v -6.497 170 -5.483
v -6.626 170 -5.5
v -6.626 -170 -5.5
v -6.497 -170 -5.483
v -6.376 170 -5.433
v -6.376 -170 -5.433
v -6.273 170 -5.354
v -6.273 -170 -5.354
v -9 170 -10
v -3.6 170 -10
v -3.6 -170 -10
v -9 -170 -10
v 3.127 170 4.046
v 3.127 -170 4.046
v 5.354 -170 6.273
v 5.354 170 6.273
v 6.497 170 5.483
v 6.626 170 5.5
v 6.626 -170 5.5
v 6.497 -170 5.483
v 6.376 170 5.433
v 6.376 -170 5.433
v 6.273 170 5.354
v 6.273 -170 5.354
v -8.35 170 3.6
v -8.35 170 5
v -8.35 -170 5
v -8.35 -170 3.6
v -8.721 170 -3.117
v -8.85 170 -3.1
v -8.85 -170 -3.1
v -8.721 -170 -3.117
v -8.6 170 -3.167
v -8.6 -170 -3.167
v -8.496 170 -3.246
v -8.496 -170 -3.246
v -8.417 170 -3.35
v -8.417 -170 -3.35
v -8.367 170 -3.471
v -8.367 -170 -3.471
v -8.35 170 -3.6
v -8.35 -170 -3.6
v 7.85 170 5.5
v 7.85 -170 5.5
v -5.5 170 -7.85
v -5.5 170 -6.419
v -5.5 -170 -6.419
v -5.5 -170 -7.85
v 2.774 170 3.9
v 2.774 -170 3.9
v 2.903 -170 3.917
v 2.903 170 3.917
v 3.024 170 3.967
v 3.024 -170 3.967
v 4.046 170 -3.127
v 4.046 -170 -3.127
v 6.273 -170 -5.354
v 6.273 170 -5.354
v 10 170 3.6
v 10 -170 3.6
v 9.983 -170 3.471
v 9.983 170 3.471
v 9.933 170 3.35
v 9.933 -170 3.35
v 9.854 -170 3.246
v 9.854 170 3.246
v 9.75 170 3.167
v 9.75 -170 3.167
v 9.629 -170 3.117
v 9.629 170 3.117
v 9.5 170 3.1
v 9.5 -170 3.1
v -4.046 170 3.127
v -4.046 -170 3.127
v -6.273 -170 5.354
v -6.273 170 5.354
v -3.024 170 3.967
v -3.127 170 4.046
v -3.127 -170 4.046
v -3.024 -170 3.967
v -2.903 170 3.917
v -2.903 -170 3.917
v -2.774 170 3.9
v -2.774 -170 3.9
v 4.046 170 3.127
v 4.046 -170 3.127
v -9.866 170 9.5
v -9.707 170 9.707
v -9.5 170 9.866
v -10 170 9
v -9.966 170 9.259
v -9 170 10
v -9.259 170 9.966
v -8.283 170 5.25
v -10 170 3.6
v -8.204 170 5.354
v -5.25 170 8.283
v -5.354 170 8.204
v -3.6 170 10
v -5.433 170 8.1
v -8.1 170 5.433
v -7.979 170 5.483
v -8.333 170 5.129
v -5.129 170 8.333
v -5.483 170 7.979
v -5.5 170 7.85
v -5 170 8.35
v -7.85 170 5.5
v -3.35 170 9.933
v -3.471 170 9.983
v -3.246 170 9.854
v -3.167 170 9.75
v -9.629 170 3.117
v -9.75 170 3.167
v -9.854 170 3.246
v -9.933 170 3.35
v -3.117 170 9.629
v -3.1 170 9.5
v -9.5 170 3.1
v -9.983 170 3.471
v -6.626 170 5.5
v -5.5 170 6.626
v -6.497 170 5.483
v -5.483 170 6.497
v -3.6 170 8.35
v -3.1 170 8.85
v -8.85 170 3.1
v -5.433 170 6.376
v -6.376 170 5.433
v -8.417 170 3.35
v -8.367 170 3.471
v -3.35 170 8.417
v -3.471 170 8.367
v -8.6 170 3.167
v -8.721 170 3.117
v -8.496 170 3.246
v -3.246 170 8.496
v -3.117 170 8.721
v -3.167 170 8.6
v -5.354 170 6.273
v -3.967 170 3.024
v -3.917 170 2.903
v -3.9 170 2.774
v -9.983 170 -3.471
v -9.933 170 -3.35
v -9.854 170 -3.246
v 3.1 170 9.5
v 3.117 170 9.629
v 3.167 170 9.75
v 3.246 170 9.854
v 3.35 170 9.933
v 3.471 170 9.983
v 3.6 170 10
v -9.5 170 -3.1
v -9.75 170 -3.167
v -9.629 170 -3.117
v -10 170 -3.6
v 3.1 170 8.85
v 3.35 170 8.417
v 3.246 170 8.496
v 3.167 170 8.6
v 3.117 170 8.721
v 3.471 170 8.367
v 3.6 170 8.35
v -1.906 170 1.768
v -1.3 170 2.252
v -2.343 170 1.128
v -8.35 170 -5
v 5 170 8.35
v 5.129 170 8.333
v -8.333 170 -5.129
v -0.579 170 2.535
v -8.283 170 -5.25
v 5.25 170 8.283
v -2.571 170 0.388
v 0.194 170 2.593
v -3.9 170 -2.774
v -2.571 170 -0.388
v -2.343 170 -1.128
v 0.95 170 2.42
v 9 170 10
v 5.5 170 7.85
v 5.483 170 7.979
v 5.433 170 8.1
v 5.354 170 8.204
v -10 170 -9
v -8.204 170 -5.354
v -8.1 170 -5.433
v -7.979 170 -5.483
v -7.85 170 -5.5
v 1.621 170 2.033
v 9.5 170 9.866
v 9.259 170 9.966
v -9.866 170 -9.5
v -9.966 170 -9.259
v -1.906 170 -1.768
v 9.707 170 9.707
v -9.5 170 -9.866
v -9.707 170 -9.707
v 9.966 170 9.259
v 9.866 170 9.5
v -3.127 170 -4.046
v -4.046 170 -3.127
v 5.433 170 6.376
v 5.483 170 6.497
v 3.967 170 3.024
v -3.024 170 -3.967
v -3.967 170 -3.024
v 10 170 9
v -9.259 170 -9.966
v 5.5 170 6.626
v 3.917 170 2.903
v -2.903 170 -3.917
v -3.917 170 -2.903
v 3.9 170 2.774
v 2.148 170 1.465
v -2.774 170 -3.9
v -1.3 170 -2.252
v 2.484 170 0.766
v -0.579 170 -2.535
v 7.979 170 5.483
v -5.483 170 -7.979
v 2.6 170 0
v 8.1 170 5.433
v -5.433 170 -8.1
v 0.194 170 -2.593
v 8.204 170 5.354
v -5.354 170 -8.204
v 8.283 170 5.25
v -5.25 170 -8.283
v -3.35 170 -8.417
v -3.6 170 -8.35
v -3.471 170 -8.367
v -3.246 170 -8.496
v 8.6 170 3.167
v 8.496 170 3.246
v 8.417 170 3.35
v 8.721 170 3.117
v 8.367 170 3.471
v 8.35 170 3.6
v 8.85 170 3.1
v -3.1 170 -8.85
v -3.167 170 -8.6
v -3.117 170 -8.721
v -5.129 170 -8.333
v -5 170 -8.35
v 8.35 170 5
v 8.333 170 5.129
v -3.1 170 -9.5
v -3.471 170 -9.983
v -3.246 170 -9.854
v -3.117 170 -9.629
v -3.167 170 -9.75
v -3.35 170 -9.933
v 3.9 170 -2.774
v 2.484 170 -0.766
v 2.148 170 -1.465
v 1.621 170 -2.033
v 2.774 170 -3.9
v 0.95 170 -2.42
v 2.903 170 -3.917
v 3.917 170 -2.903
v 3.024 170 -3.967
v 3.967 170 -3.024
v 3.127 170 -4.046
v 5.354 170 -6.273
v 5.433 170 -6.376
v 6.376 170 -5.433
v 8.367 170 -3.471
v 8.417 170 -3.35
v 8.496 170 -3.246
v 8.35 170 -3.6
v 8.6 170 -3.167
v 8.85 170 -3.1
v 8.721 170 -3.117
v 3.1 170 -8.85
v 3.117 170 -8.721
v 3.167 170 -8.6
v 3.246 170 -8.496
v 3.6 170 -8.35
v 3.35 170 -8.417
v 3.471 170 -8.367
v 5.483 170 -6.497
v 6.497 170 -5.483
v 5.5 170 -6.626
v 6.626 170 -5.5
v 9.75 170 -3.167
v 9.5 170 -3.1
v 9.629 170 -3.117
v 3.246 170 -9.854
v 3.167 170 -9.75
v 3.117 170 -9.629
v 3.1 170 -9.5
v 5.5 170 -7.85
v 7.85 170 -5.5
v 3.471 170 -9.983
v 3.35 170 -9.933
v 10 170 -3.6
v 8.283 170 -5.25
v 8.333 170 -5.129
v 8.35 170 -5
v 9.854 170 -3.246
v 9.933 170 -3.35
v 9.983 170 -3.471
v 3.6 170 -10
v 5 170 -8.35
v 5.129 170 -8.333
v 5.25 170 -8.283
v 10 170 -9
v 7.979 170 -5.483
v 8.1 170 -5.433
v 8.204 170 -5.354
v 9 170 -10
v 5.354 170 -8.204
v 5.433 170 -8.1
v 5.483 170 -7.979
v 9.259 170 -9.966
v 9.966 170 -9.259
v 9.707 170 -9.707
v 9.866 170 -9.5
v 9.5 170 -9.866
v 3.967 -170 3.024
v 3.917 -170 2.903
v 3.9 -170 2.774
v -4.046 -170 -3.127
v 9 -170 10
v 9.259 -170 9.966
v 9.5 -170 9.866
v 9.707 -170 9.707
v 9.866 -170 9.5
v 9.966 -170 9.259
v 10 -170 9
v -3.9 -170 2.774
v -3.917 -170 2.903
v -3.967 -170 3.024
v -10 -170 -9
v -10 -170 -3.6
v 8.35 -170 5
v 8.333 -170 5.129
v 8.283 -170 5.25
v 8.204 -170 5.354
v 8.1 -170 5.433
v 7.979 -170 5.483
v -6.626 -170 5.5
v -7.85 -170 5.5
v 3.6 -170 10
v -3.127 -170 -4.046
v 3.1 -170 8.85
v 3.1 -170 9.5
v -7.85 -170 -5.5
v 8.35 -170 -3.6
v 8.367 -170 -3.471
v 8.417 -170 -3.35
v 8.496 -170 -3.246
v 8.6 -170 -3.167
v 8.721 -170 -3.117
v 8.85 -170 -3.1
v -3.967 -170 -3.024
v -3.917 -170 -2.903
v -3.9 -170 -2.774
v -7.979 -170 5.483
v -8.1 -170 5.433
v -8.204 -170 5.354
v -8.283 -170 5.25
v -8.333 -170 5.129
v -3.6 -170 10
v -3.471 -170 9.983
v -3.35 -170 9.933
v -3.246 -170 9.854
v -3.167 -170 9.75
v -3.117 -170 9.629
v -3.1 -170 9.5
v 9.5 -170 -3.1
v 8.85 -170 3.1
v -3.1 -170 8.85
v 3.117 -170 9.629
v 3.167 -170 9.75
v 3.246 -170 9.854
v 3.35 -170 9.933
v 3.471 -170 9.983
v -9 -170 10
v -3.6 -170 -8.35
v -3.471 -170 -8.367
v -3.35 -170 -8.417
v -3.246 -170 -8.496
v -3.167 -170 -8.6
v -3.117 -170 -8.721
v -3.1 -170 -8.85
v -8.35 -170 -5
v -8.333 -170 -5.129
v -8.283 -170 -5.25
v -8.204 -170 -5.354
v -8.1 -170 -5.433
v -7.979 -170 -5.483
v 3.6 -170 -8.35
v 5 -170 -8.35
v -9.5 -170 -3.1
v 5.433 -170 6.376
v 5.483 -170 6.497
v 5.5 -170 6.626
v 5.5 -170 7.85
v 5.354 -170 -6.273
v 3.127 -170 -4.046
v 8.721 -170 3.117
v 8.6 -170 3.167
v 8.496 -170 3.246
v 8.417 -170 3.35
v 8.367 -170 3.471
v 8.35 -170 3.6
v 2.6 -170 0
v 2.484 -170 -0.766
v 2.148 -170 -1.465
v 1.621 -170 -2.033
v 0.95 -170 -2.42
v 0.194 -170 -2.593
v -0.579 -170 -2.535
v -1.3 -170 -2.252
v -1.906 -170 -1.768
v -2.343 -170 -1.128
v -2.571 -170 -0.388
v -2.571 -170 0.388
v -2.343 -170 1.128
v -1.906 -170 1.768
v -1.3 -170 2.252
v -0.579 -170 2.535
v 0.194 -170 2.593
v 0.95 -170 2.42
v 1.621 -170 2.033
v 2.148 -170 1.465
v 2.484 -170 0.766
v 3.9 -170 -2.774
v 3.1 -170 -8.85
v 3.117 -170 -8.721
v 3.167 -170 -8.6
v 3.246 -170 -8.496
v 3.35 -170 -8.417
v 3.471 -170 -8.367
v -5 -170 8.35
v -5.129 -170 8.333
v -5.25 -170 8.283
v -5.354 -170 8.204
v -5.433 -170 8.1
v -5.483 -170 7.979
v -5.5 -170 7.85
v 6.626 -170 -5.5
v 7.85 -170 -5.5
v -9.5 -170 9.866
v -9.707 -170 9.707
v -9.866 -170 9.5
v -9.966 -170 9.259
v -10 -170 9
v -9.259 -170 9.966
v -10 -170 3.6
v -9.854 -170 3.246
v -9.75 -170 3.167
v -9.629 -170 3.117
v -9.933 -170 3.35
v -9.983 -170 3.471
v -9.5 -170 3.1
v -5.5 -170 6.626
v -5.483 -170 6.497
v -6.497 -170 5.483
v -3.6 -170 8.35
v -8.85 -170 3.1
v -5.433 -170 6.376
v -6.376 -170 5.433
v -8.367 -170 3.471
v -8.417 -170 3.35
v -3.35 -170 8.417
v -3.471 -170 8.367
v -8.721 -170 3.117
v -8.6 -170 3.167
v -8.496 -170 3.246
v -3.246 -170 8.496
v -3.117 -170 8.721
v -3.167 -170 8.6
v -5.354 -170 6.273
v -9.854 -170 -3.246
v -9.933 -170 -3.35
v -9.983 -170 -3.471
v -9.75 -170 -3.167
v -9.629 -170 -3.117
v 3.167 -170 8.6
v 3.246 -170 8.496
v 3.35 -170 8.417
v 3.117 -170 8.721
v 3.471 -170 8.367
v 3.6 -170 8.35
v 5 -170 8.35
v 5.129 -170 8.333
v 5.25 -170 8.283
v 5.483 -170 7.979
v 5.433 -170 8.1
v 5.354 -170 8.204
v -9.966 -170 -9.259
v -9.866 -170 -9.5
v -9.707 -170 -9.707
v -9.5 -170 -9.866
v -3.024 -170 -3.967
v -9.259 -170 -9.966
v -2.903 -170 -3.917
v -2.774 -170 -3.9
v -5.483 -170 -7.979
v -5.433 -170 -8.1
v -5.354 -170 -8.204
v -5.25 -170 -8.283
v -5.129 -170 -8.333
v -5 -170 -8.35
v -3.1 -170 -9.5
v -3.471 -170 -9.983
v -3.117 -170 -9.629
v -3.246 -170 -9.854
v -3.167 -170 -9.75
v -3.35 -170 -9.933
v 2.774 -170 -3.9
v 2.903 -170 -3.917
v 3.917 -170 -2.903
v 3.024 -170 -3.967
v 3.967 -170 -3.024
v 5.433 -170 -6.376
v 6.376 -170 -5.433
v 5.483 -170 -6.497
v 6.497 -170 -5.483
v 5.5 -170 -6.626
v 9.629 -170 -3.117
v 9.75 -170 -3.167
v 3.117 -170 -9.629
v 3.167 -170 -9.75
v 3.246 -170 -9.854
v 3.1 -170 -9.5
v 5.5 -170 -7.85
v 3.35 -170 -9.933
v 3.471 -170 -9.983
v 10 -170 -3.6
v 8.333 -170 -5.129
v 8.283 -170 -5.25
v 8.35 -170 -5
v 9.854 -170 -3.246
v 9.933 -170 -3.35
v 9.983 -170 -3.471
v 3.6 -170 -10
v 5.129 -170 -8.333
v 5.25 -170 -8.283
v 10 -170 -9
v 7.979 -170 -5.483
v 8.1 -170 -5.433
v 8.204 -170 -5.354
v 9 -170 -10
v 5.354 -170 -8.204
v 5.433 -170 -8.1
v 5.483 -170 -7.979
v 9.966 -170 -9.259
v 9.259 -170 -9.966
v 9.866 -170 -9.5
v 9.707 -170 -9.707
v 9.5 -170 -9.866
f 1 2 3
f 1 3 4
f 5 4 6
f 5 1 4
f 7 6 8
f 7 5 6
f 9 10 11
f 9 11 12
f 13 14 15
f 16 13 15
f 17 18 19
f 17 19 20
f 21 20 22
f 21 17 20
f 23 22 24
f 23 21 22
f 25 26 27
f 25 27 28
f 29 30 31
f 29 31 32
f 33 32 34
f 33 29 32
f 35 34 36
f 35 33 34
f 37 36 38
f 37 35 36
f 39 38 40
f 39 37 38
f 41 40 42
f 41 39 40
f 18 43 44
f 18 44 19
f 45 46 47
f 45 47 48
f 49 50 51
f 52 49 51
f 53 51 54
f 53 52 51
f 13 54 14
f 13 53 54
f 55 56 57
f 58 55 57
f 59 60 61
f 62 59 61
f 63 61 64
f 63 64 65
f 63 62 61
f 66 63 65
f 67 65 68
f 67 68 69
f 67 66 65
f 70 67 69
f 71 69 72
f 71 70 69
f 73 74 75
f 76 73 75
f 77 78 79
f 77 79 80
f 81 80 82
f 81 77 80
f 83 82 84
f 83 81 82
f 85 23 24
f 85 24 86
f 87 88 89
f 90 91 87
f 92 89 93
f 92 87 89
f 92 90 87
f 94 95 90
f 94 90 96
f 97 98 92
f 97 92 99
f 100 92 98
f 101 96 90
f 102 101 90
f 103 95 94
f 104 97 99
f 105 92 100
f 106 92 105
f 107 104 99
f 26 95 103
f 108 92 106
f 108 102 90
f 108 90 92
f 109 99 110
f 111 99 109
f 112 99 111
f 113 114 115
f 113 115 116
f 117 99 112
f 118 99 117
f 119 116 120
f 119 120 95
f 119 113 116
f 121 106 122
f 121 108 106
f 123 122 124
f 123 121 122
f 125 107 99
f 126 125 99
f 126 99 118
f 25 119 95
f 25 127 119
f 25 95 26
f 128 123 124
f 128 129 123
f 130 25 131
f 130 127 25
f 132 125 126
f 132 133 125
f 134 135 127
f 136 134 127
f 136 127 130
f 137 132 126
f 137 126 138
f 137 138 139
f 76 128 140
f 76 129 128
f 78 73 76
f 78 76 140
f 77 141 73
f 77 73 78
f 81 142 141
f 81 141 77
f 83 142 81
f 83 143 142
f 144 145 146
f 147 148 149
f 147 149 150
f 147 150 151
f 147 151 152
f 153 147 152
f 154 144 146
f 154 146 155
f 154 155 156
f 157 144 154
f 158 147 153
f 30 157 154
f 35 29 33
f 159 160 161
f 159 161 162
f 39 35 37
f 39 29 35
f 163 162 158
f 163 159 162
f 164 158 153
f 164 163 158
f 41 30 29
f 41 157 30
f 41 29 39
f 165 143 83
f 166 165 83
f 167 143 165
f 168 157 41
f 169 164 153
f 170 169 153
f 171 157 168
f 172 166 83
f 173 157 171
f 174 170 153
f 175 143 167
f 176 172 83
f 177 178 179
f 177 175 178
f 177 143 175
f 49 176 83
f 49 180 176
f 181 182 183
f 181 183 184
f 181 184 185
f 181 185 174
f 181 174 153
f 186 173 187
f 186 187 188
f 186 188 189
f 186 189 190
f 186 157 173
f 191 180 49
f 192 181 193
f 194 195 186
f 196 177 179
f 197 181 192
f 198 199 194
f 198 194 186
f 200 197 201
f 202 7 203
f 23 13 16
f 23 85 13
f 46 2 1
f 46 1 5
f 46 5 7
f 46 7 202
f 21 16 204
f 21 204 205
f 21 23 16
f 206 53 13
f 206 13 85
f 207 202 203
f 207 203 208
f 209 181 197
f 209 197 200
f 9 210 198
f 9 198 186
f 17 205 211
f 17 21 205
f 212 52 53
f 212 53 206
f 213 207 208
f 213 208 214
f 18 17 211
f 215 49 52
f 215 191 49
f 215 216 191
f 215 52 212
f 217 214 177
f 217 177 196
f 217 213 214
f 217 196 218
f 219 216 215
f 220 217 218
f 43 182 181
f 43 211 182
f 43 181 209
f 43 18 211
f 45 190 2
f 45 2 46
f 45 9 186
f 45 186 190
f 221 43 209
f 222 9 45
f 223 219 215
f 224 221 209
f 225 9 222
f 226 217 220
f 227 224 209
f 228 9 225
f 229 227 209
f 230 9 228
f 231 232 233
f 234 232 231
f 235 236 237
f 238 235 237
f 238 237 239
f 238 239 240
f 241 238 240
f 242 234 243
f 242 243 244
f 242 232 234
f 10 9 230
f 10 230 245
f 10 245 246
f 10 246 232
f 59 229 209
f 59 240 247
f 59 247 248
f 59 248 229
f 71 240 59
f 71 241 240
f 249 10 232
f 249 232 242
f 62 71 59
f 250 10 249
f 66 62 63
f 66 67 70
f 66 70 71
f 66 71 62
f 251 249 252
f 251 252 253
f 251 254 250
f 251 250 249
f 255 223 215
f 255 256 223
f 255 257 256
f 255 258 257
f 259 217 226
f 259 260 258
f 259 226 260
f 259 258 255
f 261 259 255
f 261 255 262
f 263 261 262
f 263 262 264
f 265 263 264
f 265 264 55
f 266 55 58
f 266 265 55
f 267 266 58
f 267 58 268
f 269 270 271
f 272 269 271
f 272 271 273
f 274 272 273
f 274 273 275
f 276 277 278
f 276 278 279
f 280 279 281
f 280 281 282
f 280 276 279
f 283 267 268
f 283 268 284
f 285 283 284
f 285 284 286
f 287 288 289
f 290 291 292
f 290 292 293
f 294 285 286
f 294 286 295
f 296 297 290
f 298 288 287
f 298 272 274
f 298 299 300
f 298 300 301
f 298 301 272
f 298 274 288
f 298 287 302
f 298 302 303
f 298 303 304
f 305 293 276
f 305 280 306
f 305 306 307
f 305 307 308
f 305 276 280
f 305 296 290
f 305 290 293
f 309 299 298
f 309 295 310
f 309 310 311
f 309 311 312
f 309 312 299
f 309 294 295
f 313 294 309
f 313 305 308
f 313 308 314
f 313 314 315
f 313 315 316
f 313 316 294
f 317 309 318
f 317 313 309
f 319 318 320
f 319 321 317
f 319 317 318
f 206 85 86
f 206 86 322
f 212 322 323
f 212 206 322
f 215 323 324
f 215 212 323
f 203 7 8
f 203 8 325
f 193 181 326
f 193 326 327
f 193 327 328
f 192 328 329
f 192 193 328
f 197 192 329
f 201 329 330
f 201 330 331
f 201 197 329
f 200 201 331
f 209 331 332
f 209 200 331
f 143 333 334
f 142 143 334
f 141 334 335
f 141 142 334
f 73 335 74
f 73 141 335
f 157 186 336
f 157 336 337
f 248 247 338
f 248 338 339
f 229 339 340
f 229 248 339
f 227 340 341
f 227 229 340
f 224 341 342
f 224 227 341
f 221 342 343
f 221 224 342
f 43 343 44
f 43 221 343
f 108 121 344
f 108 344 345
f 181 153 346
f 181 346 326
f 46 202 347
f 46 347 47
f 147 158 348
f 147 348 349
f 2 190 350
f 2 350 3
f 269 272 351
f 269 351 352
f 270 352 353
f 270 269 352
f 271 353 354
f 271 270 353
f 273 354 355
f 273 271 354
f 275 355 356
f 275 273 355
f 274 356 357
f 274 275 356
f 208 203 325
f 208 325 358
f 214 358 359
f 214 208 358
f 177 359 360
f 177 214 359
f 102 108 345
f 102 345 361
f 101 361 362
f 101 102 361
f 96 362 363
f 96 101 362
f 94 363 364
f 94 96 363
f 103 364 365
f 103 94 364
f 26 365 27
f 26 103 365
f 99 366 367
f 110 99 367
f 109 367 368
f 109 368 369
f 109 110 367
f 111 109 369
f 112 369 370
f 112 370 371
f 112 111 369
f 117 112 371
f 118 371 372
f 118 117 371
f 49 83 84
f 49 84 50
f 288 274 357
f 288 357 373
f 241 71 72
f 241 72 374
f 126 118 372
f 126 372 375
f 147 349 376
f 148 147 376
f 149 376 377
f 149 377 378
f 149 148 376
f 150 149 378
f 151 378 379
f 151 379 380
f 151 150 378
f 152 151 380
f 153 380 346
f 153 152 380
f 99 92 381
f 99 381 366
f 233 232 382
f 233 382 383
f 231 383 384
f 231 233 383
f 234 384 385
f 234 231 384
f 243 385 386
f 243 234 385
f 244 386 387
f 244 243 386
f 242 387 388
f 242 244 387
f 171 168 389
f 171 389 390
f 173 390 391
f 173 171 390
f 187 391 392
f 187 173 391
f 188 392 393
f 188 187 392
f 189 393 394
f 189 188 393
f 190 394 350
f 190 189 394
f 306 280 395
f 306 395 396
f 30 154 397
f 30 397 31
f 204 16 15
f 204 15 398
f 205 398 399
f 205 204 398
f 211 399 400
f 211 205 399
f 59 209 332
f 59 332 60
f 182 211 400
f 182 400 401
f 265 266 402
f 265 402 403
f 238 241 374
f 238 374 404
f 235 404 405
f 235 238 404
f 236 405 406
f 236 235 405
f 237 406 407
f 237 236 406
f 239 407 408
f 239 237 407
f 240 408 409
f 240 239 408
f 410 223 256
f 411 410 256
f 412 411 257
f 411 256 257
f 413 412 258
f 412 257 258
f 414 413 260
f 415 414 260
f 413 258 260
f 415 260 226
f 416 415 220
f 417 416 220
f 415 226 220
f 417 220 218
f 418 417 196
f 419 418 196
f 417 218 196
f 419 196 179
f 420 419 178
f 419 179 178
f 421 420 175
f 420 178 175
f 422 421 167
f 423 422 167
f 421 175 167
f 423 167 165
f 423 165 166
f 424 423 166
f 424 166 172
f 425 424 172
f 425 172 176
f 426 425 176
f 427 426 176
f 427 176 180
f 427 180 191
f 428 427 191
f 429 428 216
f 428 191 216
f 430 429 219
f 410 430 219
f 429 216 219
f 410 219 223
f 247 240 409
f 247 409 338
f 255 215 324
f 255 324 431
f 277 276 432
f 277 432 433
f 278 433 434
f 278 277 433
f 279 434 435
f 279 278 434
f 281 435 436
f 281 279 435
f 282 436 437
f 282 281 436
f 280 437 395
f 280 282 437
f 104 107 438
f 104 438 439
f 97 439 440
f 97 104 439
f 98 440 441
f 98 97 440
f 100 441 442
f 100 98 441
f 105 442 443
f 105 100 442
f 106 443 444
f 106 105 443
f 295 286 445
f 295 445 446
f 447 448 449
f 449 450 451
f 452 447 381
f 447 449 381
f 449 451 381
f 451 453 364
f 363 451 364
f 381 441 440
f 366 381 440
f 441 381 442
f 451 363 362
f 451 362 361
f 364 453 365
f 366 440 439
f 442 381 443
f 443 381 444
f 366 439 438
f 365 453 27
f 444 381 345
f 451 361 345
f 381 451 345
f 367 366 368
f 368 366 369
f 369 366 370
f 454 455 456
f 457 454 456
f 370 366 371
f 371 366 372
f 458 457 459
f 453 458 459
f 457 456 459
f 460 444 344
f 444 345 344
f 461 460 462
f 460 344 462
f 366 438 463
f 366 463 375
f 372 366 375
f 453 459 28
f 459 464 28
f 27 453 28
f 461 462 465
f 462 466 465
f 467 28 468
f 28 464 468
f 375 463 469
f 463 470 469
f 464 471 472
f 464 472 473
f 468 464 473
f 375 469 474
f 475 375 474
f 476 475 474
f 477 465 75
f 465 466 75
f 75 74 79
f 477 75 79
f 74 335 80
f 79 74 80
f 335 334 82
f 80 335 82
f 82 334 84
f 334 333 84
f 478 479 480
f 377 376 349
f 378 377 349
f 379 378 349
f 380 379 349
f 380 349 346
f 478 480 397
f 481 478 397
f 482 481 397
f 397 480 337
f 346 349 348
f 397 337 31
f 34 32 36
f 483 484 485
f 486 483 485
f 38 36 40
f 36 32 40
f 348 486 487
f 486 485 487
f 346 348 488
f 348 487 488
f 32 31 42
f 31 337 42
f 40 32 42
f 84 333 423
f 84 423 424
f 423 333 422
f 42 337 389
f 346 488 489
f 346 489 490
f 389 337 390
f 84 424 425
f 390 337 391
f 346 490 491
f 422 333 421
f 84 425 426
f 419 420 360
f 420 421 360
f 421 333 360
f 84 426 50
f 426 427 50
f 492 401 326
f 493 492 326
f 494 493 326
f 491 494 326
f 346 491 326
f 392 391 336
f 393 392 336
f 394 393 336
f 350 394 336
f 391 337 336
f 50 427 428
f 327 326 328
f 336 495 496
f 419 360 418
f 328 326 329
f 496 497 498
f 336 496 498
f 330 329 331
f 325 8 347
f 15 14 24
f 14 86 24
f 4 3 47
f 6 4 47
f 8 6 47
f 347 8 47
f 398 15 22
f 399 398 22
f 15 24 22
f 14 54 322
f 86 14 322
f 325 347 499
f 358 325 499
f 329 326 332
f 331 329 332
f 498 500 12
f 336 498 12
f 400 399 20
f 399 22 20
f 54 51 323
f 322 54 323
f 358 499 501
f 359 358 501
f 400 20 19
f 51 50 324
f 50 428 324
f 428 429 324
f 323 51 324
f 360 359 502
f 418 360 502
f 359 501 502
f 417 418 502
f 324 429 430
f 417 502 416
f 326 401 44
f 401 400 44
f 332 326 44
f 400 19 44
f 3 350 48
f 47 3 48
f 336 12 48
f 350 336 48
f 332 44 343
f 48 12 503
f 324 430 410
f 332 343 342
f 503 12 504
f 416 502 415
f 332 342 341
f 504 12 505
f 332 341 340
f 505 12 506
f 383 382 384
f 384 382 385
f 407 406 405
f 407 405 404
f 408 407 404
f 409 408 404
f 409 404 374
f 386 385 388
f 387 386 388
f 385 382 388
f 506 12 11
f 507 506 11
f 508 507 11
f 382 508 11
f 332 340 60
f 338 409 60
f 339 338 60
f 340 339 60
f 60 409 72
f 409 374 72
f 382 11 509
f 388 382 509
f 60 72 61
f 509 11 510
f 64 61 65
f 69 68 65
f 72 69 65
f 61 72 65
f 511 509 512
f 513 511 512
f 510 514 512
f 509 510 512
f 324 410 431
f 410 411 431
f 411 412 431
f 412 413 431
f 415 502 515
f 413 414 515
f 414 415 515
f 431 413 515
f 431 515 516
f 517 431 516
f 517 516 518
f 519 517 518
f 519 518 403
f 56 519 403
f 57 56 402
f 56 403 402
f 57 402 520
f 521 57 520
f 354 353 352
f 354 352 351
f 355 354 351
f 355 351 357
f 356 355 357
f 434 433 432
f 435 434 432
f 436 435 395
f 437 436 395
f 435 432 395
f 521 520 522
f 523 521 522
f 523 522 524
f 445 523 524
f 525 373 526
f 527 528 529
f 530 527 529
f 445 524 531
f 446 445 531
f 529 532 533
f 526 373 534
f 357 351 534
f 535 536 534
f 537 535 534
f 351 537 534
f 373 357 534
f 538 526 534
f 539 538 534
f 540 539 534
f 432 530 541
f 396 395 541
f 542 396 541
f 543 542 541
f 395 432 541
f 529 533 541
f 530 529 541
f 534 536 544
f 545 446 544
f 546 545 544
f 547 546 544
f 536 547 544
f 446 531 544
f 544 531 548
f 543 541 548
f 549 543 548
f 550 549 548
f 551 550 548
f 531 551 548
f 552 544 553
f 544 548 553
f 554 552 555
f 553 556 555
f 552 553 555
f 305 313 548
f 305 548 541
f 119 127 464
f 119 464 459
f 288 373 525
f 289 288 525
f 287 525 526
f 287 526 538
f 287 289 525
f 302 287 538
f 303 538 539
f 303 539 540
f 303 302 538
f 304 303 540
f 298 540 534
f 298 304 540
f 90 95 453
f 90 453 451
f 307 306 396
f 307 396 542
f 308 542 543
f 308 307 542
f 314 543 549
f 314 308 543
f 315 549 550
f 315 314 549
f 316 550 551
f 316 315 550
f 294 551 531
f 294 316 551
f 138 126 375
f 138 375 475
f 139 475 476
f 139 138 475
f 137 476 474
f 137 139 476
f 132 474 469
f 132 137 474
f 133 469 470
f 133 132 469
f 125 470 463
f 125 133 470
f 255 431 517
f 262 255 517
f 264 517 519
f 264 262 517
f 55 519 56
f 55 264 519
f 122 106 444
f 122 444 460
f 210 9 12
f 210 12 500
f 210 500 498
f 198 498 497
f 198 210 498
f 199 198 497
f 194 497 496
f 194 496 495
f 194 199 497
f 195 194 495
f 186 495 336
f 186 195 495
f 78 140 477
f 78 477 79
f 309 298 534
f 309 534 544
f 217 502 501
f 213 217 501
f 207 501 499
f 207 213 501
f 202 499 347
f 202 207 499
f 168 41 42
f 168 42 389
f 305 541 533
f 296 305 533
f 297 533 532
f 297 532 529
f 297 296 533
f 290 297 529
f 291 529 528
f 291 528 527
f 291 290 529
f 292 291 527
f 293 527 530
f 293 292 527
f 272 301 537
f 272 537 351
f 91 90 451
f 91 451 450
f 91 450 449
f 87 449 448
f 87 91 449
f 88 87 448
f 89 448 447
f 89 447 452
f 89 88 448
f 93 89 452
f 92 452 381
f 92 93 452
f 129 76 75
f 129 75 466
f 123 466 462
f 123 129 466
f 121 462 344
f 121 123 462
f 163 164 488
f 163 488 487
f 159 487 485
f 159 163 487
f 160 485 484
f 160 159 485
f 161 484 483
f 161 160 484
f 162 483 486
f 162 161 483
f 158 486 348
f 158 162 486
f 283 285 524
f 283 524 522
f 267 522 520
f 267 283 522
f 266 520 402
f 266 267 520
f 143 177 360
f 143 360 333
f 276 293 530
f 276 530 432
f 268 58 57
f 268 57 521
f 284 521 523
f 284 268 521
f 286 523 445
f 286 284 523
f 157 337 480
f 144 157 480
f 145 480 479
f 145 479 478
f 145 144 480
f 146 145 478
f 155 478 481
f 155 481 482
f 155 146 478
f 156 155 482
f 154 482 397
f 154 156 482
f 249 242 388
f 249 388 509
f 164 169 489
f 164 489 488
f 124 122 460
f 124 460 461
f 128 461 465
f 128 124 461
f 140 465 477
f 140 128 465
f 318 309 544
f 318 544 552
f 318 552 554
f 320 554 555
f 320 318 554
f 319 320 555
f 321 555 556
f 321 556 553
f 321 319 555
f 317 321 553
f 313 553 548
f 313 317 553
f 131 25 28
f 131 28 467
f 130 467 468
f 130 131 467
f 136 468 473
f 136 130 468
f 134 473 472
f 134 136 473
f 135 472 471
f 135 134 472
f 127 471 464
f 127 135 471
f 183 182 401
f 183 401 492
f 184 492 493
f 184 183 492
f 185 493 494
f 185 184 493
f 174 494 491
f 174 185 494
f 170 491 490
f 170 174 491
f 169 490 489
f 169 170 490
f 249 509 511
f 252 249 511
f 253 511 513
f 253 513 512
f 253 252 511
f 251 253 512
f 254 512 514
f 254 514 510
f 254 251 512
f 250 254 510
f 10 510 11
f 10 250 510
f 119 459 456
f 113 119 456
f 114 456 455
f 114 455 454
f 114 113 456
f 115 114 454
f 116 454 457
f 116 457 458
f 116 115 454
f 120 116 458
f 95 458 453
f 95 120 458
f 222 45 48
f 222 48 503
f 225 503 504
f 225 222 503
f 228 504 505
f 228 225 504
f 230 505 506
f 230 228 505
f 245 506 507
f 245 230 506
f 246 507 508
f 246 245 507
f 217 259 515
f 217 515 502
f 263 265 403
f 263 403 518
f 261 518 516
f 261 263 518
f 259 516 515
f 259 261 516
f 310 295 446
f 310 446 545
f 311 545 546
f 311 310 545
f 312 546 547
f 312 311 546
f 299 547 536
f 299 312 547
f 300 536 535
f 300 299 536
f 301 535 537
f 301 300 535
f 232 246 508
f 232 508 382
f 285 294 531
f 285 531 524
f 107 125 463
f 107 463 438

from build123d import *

# Parameters (mm, degrees)
SKETCH1_R           = 2.6
BOSS_EXTRUDE1_DEPTH = 340


with BuildPart() as part:
    # Sketch1 → Boss-Extrude1 (new body)
    with BuildSketch(Plane(origin=(0, 170, 0), x_dir=(1, 0, 0), z_dir=(0, 1, 0))):
        with BuildLine():
            Line((-3.1, 8.85), (-3.1, 9.5))
            ThreePointArc((-3.1, 9.5), (-3.246446609, 9.853553391), (-3.6, 10))
            Line((-3.6, 10), (-9, 10))
            ThreePointArc((-9, 10), (-9.707106781, 9.707106781), (-10, 9))
            Line((-10, 9), (-10, 3.6))
            ThreePointArc((-10, 3.6), (-9.853553391, 3.246446609), (-9.5, 3.1))
            Line((-9.5, 3.1), (-8.85, 3.1))
            ThreePointArc((-8.85, 3.1), (-8.496446609, 3.246446609), (-8.35, 3.6))
            Line((-8.35, 3.6), (-8.35, 5))
            ThreePointArc((-8.35, 5), (-8.203553391, 5.353553391), (-7.85, 5.5))
            Line((-7.85, 5.5), (-6.626345597, 5.5))
            ThreePointArc((-6.626345597, 5.5), (-6.435003881, 5.461939766), (-6.272792206, 5.353553391))
            Line((-6.272792206, 5.353553391), (-4.046446609, 3.127207794))
            ThreePointArc((-4.046446609, 3.127207794), (-3.938060234, 2.964996119), (-3.9, 2.773654403))
            Line((-3.9, 2.773654403), (-3.9, -2.773654403))
            ThreePointArc((-3.9, -2.773654403), (-3.938060234, -2.964996119), (-4.046446609, -3.127207794))
            Line((-4.046446609, -3.127207794), (-6.272792206, -5.353553391))
            ThreePointArc((-6.272792206, -5.353553391), (-6.435003881, -5.461939766), (-6.626345597, -5.5))
            Line((-6.626345597, -5.5), (-7.85, -5.5))
            ThreePointArc((-7.85, -5.5), (-8.203553391, -5.353553391), (-8.35, -5))
            Line((-8.35, -5), (-8.35, -3.6))
            ThreePointArc((-8.35, -3.6), (-8.496446609, -3.246446609), (-8.85, -3.1))
            Line((-8.85, -3.1), (-9.5, -3.1))
            ThreePointArc((-9.5, -3.1), (-9.853553391, -3.246446609), (-10, -3.6))
            Line((-10, -3.6), (-10, -9))
            ThreePointArc((-10, -9), (-9.707106781, -9.707106781), (-9, -10))
            Line((-9, -10), (-3.6, -10))
            ThreePointArc((-3.6, -10), (-3.246446609, -9.853553391), (-3.1, -9.5))
            Line((-3.1, -9.5), (-3.1, -8.85))
            ThreePointArc((-3.1, -8.85), (-3.246446609, -8.496446609), (-3.6, -8.35))
            Line((-3.6, -8.35), (-5, -8.35))
            ThreePointArc((-5, -8.35), (-5.353553391, -8.203553391), (-5.5, -7.85))
            Line((-5.5, -7.85), (-5.5, -6.626345597))
            ThreePointArc((-5.5, -6.626345597), (-5.461939766, -6.435003881), (-5.353553391, -6.272792206))
            Line((-5.353553391, -6.272792206), (-3.127207794, -4.046446609))
            ThreePointArc((-3.127207794, -4.046446609), (-2.964996119, -3.938060234), (-2.773654403, -3.9))
            Line((-2.773654403, -3.9), (2.773654403, -3.9))
            ThreePointArc((2.773654403, -3.9), (2.964996119, -3.938060234), (3.127207794, -4.046446609))
            Line((3.127207794, -4.046446609), (5.353553391, -6.272792206))
            ThreePointArc((5.353553391, -6.272792206), (5.461939766, -6.435003881), (5.5, -6.626345597))
            Line((5.5, -6.626345597), (5.5, -7.85))
            ThreePointArc((5.5, -7.85), (5.353553391, -8.203553391), (5, -8.35))
            Line((5, -8.35), (3.6, -8.35))
            ThreePointArc((3.6, -8.35), (3.246446609, -8.496446609), (3.1, -8.85))
            Line((3.1, -8.85), (3.1, -9.5))
            ThreePointArc((3.1, -9.5), (3.246446609, -9.853553391), (3.6, -10))
            Line((3.6, -10), (9, -10))
            ThreePointArc((9, -10), (9.707106781, -9.707106781), (10, -9))
            Line((10, -9), (10, -3.6))
            ThreePointArc((10, -3.6), (9.853553391, -3.246446609), (9.5, -3.1))
            Line((9.5, -3.1), (8.85, -3.1))
            ThreePointArc((8.85, -3.1), (8.496446609, -3.246446609), (8.35, -3.6))
            Line((8.35, -3.6), (8.35, -5))
            ThreePointArc((8.35, -5), (8.203553391, -5.353553391), (7.85, -5.5))
            Line((7.85, -5.5), (6.626345597, -5.5))
            ThreePointArc((6.626345597, -5.5), (6.435003881, -5.461939766), (6.272792206, -5.353553391))
            Line((6.272792206, -5.353553391), (4.046446609, -3.127207794))
            ThreePointArc((4.046446609, -3.127207794), (3.938060234, -2.964996119), (3.9, -2.773654403))
            Line((3.9, -2.773654403), (3.9, 2.773654403))
            ThreePointArc((3.9, 2.773654403), (3.938060234, 2.964996119), (4.046446609, 3.127207794))
            Line((4.046446609, 3.127207794), (6.272792206, 5.353553391))
            ThreePointArc((6.272792206, 5.353553391), (6.435003881, 5.461939766), (6.626345597, 5.5))
            Line((6.626345597, 5.5), (7.85, 5.5))
            ThreePointArc((7.85, 5.5), (8.203553391, 5.353553391), (8.35, 5))
            Line((8.35, 5), (8.35, 3.6))
            ThreePointArc((8.35, 3.6), (8.496446609, 3.246446609), (8.85, 3.1))
            Line((8.85, 3.1), (9.5, 3.1))
            ThreePointArc((9.5, 3.1), (9.853553391, 3.246446609), (10, 3.6))
            Line((10, 3.6), (10, 9))
            ThreePointArc((10, 9), (9.707106781, 9.707106781), (9, 10))
            Line((9, 10), (3.6, 10))
            ThreePointArc((3.6, 10), (3.246446609, 9.853553391), (3.1, 9.5))
            Line((3.1, 9.5), (3.1, 8.85))
            ThreePointArc((3.1, 8.85), (3.246446609, 8.496446609), (3.6, 8.35))
            Line((3.6, 8.35), (5, 8.35))
            ThreePointArc((5, 8.35), (5.353553391, 8.203553391), (5.5, 7.85))
            Line((5.5, 7.85), (5.5, 6.626345597))
            ThreePointArc((5.5, 6.626345597), (5.461939766, 6.435003881), (5.353553391, 6.272792206))
            Line((5.353553391, 6.272792206), (3.127207794, 4.046446609))
            ThreePointArc((3.127207794, 4.046446609), (2.964996119, 3.938060234), (2.773654403, 3.9))
            Line((2.773654403, 3.9), (-2.773654403, 3.9))
            ThreePointArc((-2.773654403, 3.9), (-2.964996119, 3.938060234), (-3.127207794, 4.046446609))
            Line((-3.127207794, 4.046446609), (-5.5, 6.419238816))
            Line((-5.5, 6.419238816), (-5.5, 7.85))
            ThreePointArc((-5.5, 7.85), (-5.353553391, 8.203553391), (-5, 8.35))
            Line((-5, 8.35), (-3.6, 8.35))
            ThreePointArc((-3.6, 8.35), (-3.246446609, 8.496446609), (-3.1, 8.85))
        make_face()
        Circle(SKETCH1_R, mode=Mode.SUBTRACT)
    extrude(amount=-BOSS_EXTRUDE1_DEPTH)


solid = part.part
